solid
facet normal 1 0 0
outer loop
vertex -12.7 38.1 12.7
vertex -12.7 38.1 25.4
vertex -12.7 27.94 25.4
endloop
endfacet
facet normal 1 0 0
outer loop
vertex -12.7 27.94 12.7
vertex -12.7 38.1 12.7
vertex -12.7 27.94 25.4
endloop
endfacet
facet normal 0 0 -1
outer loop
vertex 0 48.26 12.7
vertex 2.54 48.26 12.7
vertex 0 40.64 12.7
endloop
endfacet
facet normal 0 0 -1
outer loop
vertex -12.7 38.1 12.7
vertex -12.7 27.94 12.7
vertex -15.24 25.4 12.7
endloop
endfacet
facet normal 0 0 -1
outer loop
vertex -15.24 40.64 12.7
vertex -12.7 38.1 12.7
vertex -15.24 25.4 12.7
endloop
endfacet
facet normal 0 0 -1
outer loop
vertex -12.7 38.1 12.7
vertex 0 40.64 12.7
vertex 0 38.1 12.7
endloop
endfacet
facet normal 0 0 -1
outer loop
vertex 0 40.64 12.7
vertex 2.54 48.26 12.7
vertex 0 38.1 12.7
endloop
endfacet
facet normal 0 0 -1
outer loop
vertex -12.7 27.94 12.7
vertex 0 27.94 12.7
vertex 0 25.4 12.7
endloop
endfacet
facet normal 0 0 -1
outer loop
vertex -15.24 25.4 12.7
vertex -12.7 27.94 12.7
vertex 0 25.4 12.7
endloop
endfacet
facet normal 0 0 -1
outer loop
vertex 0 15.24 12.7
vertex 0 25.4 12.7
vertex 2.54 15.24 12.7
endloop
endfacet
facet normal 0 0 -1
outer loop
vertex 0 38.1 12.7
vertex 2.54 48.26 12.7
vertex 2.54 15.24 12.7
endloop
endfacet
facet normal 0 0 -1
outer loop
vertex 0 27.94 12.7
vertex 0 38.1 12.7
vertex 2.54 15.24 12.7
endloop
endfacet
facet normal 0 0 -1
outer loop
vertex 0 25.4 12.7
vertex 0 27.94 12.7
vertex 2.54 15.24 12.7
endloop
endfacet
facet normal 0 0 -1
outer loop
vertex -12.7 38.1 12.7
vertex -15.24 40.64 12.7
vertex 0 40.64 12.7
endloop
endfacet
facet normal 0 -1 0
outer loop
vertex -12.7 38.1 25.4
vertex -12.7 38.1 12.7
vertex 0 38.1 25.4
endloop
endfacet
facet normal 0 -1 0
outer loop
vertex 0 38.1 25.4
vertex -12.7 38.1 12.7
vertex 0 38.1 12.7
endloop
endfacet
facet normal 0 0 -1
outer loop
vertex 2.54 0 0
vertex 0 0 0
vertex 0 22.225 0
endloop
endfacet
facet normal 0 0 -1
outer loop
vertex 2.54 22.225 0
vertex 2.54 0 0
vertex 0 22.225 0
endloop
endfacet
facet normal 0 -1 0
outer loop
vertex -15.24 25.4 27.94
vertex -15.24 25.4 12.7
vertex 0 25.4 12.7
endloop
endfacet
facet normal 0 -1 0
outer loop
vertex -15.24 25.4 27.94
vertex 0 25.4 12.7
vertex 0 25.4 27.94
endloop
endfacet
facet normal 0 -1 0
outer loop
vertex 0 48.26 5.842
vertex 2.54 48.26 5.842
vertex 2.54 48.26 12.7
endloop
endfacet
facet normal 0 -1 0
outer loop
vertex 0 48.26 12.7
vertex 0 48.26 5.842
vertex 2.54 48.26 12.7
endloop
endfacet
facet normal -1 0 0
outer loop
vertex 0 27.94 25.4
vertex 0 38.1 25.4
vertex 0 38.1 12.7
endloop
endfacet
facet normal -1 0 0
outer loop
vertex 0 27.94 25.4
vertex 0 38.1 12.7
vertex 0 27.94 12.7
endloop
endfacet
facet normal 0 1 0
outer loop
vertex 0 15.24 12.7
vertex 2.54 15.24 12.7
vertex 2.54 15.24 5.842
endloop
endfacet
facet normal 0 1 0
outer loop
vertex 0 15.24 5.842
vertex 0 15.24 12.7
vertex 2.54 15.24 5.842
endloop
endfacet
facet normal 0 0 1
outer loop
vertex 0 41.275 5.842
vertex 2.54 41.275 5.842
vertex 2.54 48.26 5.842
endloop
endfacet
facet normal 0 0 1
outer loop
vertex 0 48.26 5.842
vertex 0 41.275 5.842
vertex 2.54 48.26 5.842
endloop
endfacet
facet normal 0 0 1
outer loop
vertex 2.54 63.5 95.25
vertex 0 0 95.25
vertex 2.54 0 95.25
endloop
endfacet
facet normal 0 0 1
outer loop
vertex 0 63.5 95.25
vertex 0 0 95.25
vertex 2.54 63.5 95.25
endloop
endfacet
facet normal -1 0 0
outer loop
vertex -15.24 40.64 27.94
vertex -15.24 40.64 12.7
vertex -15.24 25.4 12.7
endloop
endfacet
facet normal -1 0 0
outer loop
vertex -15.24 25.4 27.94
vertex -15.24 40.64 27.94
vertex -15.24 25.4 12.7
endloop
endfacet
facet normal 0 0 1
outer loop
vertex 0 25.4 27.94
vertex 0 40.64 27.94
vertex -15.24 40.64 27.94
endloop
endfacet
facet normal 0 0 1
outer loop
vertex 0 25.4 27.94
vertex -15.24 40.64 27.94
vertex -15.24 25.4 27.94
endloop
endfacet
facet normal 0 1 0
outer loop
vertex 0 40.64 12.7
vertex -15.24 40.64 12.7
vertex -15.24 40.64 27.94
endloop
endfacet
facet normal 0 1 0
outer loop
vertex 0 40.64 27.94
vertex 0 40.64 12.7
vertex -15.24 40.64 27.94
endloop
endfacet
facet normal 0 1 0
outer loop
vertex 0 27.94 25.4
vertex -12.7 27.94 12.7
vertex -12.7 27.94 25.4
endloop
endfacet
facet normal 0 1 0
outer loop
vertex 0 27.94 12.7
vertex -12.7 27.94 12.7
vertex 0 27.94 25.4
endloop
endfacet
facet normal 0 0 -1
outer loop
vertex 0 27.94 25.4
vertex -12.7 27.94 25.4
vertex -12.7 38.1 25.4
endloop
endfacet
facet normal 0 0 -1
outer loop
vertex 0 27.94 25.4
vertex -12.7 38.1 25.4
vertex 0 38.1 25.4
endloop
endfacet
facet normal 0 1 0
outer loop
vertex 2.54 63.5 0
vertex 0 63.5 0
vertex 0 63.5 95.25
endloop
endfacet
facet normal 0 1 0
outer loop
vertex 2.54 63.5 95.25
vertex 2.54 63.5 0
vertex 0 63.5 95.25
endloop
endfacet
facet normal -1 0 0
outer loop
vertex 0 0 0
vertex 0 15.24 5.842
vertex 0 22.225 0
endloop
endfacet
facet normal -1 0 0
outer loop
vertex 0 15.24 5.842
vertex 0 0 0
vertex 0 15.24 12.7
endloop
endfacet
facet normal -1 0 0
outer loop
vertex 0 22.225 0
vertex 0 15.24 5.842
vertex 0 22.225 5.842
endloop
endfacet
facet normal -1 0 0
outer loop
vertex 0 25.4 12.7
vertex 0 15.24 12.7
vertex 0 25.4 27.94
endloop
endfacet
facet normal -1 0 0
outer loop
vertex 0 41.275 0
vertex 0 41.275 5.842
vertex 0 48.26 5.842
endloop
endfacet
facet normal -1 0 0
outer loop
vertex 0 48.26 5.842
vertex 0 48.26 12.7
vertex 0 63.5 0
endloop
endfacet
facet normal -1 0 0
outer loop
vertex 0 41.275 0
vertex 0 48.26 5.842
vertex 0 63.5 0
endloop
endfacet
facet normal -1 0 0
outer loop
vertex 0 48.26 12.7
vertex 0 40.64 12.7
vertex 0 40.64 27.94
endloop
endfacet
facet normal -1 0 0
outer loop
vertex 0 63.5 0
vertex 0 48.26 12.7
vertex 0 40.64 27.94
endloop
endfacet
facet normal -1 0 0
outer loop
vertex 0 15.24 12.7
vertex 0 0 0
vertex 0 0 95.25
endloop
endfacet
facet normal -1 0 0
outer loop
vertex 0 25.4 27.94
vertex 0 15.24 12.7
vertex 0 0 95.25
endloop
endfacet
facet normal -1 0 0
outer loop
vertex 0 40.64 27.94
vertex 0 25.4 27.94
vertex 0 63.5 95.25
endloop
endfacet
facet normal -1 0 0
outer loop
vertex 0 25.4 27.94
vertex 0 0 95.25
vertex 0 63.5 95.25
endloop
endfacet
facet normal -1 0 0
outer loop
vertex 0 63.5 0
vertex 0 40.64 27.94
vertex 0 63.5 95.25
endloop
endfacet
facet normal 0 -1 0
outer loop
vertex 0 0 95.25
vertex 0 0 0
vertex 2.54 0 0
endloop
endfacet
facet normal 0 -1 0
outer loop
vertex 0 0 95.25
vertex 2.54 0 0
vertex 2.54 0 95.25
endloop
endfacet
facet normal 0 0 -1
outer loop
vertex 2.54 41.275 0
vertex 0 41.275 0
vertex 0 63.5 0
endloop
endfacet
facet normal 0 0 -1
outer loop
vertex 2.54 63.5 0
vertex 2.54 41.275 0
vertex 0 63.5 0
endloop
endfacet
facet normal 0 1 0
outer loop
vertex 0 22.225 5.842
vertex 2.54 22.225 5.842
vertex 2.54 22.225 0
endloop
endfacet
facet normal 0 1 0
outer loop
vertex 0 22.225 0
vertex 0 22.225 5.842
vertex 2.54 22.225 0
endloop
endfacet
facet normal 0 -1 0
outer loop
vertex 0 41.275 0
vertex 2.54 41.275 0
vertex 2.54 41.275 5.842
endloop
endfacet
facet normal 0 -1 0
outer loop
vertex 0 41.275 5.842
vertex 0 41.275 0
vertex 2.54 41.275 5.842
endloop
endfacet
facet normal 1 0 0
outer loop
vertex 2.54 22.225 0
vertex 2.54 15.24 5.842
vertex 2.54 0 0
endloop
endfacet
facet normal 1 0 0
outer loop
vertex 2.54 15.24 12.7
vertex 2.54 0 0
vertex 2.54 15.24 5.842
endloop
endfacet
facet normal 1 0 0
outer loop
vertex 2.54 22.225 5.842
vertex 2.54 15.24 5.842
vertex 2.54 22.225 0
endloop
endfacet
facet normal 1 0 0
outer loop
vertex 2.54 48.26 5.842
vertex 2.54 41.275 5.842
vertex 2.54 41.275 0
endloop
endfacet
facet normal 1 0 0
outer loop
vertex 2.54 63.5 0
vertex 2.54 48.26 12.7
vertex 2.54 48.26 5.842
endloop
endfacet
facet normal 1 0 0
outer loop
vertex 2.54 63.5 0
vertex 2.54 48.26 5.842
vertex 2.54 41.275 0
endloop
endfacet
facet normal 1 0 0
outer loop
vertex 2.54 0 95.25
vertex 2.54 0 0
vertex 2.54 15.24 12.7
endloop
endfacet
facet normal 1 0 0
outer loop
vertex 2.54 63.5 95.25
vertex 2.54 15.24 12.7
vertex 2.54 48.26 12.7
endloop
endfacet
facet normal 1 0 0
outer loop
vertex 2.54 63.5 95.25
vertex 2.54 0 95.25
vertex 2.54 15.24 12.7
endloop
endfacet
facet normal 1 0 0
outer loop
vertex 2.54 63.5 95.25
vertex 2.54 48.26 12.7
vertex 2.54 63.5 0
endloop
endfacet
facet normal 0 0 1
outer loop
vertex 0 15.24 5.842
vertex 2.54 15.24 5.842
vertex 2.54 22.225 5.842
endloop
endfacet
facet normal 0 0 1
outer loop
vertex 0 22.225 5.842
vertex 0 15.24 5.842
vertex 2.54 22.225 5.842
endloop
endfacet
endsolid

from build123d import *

# Parameters (mm, degrees)
SKETCH1_W           = 63.5
SKETCH1_H           = 95.25
BOSS_EXTRUDE1_DEPTH = 2.54
CUT_EXTRUDE1_DEPTH  = 13.97
SKETCH5_W           = 15.24
SKETCH5_H           = 15.24
BOSS_EXTRUDE2_DEPTH = 15.24
SKETCH6_W           = 12.7
SKETCH6_H           = 10.16
CUT_EXTRUDE2_DEPTH  = 12.7


with BuildPart() as part:
    # Sketch1 → Boss-Extrude1 (new body)
    with BuildSketch(Plane.YZ):
        with Locations((31.75, 47.625)):
            Rectangle(SKETCH1_W, SKETCH1_H)
    extrude(amount=BOSS_EXTRUDE1_DEPTH)

    # Sketch4 → Cut-Extrude1 (cut)
    with BuildSketch(Plane.YZ.offset(2.54)):
        Polygon((22.225, 0), (41.275, 0), (41.275, 5.842), (48.26, 5.842), (48.26, 12.7), (41.402, 12.7), (22.098, 12.7), (15.24, 12.7), (15.24, 5.842), (22.225, 5.842), align=None)
    extrude(amount=-CUT_EXTRUDE1_DEPTH, mode=Mode.SUBTRACT)

    # Sketch5 → Boss-Extrude2 (add)
    with BuildSketch(Plane(origin=(0, 0, 0), x_dir=(0, -1, 0), z_dir=(-1, 0, 0))):
        with Locations((-33.02, 20.32)):
            Rectangle(SKETCH5_W, SKETCH5_H)
    extrude(amount=BOSS_EXTRUDE2_DEPTH)

    # Sketch6 → Cut-Extrude2 (cut)
    with BuildSketch(Plane(origin=(0, 0, 12.7), x_dir=(1, 0, 0), z_dir=(0, 0, -1))):
        with Locations((-6.35, -33.02)):
            Rectangle(SKETCH6_W, SKETCH6_H)
    extrude(amount=-CUT_EXTRUDE2_DEPTH, mode=Mode.SUBTRACT)


solid = part.part
